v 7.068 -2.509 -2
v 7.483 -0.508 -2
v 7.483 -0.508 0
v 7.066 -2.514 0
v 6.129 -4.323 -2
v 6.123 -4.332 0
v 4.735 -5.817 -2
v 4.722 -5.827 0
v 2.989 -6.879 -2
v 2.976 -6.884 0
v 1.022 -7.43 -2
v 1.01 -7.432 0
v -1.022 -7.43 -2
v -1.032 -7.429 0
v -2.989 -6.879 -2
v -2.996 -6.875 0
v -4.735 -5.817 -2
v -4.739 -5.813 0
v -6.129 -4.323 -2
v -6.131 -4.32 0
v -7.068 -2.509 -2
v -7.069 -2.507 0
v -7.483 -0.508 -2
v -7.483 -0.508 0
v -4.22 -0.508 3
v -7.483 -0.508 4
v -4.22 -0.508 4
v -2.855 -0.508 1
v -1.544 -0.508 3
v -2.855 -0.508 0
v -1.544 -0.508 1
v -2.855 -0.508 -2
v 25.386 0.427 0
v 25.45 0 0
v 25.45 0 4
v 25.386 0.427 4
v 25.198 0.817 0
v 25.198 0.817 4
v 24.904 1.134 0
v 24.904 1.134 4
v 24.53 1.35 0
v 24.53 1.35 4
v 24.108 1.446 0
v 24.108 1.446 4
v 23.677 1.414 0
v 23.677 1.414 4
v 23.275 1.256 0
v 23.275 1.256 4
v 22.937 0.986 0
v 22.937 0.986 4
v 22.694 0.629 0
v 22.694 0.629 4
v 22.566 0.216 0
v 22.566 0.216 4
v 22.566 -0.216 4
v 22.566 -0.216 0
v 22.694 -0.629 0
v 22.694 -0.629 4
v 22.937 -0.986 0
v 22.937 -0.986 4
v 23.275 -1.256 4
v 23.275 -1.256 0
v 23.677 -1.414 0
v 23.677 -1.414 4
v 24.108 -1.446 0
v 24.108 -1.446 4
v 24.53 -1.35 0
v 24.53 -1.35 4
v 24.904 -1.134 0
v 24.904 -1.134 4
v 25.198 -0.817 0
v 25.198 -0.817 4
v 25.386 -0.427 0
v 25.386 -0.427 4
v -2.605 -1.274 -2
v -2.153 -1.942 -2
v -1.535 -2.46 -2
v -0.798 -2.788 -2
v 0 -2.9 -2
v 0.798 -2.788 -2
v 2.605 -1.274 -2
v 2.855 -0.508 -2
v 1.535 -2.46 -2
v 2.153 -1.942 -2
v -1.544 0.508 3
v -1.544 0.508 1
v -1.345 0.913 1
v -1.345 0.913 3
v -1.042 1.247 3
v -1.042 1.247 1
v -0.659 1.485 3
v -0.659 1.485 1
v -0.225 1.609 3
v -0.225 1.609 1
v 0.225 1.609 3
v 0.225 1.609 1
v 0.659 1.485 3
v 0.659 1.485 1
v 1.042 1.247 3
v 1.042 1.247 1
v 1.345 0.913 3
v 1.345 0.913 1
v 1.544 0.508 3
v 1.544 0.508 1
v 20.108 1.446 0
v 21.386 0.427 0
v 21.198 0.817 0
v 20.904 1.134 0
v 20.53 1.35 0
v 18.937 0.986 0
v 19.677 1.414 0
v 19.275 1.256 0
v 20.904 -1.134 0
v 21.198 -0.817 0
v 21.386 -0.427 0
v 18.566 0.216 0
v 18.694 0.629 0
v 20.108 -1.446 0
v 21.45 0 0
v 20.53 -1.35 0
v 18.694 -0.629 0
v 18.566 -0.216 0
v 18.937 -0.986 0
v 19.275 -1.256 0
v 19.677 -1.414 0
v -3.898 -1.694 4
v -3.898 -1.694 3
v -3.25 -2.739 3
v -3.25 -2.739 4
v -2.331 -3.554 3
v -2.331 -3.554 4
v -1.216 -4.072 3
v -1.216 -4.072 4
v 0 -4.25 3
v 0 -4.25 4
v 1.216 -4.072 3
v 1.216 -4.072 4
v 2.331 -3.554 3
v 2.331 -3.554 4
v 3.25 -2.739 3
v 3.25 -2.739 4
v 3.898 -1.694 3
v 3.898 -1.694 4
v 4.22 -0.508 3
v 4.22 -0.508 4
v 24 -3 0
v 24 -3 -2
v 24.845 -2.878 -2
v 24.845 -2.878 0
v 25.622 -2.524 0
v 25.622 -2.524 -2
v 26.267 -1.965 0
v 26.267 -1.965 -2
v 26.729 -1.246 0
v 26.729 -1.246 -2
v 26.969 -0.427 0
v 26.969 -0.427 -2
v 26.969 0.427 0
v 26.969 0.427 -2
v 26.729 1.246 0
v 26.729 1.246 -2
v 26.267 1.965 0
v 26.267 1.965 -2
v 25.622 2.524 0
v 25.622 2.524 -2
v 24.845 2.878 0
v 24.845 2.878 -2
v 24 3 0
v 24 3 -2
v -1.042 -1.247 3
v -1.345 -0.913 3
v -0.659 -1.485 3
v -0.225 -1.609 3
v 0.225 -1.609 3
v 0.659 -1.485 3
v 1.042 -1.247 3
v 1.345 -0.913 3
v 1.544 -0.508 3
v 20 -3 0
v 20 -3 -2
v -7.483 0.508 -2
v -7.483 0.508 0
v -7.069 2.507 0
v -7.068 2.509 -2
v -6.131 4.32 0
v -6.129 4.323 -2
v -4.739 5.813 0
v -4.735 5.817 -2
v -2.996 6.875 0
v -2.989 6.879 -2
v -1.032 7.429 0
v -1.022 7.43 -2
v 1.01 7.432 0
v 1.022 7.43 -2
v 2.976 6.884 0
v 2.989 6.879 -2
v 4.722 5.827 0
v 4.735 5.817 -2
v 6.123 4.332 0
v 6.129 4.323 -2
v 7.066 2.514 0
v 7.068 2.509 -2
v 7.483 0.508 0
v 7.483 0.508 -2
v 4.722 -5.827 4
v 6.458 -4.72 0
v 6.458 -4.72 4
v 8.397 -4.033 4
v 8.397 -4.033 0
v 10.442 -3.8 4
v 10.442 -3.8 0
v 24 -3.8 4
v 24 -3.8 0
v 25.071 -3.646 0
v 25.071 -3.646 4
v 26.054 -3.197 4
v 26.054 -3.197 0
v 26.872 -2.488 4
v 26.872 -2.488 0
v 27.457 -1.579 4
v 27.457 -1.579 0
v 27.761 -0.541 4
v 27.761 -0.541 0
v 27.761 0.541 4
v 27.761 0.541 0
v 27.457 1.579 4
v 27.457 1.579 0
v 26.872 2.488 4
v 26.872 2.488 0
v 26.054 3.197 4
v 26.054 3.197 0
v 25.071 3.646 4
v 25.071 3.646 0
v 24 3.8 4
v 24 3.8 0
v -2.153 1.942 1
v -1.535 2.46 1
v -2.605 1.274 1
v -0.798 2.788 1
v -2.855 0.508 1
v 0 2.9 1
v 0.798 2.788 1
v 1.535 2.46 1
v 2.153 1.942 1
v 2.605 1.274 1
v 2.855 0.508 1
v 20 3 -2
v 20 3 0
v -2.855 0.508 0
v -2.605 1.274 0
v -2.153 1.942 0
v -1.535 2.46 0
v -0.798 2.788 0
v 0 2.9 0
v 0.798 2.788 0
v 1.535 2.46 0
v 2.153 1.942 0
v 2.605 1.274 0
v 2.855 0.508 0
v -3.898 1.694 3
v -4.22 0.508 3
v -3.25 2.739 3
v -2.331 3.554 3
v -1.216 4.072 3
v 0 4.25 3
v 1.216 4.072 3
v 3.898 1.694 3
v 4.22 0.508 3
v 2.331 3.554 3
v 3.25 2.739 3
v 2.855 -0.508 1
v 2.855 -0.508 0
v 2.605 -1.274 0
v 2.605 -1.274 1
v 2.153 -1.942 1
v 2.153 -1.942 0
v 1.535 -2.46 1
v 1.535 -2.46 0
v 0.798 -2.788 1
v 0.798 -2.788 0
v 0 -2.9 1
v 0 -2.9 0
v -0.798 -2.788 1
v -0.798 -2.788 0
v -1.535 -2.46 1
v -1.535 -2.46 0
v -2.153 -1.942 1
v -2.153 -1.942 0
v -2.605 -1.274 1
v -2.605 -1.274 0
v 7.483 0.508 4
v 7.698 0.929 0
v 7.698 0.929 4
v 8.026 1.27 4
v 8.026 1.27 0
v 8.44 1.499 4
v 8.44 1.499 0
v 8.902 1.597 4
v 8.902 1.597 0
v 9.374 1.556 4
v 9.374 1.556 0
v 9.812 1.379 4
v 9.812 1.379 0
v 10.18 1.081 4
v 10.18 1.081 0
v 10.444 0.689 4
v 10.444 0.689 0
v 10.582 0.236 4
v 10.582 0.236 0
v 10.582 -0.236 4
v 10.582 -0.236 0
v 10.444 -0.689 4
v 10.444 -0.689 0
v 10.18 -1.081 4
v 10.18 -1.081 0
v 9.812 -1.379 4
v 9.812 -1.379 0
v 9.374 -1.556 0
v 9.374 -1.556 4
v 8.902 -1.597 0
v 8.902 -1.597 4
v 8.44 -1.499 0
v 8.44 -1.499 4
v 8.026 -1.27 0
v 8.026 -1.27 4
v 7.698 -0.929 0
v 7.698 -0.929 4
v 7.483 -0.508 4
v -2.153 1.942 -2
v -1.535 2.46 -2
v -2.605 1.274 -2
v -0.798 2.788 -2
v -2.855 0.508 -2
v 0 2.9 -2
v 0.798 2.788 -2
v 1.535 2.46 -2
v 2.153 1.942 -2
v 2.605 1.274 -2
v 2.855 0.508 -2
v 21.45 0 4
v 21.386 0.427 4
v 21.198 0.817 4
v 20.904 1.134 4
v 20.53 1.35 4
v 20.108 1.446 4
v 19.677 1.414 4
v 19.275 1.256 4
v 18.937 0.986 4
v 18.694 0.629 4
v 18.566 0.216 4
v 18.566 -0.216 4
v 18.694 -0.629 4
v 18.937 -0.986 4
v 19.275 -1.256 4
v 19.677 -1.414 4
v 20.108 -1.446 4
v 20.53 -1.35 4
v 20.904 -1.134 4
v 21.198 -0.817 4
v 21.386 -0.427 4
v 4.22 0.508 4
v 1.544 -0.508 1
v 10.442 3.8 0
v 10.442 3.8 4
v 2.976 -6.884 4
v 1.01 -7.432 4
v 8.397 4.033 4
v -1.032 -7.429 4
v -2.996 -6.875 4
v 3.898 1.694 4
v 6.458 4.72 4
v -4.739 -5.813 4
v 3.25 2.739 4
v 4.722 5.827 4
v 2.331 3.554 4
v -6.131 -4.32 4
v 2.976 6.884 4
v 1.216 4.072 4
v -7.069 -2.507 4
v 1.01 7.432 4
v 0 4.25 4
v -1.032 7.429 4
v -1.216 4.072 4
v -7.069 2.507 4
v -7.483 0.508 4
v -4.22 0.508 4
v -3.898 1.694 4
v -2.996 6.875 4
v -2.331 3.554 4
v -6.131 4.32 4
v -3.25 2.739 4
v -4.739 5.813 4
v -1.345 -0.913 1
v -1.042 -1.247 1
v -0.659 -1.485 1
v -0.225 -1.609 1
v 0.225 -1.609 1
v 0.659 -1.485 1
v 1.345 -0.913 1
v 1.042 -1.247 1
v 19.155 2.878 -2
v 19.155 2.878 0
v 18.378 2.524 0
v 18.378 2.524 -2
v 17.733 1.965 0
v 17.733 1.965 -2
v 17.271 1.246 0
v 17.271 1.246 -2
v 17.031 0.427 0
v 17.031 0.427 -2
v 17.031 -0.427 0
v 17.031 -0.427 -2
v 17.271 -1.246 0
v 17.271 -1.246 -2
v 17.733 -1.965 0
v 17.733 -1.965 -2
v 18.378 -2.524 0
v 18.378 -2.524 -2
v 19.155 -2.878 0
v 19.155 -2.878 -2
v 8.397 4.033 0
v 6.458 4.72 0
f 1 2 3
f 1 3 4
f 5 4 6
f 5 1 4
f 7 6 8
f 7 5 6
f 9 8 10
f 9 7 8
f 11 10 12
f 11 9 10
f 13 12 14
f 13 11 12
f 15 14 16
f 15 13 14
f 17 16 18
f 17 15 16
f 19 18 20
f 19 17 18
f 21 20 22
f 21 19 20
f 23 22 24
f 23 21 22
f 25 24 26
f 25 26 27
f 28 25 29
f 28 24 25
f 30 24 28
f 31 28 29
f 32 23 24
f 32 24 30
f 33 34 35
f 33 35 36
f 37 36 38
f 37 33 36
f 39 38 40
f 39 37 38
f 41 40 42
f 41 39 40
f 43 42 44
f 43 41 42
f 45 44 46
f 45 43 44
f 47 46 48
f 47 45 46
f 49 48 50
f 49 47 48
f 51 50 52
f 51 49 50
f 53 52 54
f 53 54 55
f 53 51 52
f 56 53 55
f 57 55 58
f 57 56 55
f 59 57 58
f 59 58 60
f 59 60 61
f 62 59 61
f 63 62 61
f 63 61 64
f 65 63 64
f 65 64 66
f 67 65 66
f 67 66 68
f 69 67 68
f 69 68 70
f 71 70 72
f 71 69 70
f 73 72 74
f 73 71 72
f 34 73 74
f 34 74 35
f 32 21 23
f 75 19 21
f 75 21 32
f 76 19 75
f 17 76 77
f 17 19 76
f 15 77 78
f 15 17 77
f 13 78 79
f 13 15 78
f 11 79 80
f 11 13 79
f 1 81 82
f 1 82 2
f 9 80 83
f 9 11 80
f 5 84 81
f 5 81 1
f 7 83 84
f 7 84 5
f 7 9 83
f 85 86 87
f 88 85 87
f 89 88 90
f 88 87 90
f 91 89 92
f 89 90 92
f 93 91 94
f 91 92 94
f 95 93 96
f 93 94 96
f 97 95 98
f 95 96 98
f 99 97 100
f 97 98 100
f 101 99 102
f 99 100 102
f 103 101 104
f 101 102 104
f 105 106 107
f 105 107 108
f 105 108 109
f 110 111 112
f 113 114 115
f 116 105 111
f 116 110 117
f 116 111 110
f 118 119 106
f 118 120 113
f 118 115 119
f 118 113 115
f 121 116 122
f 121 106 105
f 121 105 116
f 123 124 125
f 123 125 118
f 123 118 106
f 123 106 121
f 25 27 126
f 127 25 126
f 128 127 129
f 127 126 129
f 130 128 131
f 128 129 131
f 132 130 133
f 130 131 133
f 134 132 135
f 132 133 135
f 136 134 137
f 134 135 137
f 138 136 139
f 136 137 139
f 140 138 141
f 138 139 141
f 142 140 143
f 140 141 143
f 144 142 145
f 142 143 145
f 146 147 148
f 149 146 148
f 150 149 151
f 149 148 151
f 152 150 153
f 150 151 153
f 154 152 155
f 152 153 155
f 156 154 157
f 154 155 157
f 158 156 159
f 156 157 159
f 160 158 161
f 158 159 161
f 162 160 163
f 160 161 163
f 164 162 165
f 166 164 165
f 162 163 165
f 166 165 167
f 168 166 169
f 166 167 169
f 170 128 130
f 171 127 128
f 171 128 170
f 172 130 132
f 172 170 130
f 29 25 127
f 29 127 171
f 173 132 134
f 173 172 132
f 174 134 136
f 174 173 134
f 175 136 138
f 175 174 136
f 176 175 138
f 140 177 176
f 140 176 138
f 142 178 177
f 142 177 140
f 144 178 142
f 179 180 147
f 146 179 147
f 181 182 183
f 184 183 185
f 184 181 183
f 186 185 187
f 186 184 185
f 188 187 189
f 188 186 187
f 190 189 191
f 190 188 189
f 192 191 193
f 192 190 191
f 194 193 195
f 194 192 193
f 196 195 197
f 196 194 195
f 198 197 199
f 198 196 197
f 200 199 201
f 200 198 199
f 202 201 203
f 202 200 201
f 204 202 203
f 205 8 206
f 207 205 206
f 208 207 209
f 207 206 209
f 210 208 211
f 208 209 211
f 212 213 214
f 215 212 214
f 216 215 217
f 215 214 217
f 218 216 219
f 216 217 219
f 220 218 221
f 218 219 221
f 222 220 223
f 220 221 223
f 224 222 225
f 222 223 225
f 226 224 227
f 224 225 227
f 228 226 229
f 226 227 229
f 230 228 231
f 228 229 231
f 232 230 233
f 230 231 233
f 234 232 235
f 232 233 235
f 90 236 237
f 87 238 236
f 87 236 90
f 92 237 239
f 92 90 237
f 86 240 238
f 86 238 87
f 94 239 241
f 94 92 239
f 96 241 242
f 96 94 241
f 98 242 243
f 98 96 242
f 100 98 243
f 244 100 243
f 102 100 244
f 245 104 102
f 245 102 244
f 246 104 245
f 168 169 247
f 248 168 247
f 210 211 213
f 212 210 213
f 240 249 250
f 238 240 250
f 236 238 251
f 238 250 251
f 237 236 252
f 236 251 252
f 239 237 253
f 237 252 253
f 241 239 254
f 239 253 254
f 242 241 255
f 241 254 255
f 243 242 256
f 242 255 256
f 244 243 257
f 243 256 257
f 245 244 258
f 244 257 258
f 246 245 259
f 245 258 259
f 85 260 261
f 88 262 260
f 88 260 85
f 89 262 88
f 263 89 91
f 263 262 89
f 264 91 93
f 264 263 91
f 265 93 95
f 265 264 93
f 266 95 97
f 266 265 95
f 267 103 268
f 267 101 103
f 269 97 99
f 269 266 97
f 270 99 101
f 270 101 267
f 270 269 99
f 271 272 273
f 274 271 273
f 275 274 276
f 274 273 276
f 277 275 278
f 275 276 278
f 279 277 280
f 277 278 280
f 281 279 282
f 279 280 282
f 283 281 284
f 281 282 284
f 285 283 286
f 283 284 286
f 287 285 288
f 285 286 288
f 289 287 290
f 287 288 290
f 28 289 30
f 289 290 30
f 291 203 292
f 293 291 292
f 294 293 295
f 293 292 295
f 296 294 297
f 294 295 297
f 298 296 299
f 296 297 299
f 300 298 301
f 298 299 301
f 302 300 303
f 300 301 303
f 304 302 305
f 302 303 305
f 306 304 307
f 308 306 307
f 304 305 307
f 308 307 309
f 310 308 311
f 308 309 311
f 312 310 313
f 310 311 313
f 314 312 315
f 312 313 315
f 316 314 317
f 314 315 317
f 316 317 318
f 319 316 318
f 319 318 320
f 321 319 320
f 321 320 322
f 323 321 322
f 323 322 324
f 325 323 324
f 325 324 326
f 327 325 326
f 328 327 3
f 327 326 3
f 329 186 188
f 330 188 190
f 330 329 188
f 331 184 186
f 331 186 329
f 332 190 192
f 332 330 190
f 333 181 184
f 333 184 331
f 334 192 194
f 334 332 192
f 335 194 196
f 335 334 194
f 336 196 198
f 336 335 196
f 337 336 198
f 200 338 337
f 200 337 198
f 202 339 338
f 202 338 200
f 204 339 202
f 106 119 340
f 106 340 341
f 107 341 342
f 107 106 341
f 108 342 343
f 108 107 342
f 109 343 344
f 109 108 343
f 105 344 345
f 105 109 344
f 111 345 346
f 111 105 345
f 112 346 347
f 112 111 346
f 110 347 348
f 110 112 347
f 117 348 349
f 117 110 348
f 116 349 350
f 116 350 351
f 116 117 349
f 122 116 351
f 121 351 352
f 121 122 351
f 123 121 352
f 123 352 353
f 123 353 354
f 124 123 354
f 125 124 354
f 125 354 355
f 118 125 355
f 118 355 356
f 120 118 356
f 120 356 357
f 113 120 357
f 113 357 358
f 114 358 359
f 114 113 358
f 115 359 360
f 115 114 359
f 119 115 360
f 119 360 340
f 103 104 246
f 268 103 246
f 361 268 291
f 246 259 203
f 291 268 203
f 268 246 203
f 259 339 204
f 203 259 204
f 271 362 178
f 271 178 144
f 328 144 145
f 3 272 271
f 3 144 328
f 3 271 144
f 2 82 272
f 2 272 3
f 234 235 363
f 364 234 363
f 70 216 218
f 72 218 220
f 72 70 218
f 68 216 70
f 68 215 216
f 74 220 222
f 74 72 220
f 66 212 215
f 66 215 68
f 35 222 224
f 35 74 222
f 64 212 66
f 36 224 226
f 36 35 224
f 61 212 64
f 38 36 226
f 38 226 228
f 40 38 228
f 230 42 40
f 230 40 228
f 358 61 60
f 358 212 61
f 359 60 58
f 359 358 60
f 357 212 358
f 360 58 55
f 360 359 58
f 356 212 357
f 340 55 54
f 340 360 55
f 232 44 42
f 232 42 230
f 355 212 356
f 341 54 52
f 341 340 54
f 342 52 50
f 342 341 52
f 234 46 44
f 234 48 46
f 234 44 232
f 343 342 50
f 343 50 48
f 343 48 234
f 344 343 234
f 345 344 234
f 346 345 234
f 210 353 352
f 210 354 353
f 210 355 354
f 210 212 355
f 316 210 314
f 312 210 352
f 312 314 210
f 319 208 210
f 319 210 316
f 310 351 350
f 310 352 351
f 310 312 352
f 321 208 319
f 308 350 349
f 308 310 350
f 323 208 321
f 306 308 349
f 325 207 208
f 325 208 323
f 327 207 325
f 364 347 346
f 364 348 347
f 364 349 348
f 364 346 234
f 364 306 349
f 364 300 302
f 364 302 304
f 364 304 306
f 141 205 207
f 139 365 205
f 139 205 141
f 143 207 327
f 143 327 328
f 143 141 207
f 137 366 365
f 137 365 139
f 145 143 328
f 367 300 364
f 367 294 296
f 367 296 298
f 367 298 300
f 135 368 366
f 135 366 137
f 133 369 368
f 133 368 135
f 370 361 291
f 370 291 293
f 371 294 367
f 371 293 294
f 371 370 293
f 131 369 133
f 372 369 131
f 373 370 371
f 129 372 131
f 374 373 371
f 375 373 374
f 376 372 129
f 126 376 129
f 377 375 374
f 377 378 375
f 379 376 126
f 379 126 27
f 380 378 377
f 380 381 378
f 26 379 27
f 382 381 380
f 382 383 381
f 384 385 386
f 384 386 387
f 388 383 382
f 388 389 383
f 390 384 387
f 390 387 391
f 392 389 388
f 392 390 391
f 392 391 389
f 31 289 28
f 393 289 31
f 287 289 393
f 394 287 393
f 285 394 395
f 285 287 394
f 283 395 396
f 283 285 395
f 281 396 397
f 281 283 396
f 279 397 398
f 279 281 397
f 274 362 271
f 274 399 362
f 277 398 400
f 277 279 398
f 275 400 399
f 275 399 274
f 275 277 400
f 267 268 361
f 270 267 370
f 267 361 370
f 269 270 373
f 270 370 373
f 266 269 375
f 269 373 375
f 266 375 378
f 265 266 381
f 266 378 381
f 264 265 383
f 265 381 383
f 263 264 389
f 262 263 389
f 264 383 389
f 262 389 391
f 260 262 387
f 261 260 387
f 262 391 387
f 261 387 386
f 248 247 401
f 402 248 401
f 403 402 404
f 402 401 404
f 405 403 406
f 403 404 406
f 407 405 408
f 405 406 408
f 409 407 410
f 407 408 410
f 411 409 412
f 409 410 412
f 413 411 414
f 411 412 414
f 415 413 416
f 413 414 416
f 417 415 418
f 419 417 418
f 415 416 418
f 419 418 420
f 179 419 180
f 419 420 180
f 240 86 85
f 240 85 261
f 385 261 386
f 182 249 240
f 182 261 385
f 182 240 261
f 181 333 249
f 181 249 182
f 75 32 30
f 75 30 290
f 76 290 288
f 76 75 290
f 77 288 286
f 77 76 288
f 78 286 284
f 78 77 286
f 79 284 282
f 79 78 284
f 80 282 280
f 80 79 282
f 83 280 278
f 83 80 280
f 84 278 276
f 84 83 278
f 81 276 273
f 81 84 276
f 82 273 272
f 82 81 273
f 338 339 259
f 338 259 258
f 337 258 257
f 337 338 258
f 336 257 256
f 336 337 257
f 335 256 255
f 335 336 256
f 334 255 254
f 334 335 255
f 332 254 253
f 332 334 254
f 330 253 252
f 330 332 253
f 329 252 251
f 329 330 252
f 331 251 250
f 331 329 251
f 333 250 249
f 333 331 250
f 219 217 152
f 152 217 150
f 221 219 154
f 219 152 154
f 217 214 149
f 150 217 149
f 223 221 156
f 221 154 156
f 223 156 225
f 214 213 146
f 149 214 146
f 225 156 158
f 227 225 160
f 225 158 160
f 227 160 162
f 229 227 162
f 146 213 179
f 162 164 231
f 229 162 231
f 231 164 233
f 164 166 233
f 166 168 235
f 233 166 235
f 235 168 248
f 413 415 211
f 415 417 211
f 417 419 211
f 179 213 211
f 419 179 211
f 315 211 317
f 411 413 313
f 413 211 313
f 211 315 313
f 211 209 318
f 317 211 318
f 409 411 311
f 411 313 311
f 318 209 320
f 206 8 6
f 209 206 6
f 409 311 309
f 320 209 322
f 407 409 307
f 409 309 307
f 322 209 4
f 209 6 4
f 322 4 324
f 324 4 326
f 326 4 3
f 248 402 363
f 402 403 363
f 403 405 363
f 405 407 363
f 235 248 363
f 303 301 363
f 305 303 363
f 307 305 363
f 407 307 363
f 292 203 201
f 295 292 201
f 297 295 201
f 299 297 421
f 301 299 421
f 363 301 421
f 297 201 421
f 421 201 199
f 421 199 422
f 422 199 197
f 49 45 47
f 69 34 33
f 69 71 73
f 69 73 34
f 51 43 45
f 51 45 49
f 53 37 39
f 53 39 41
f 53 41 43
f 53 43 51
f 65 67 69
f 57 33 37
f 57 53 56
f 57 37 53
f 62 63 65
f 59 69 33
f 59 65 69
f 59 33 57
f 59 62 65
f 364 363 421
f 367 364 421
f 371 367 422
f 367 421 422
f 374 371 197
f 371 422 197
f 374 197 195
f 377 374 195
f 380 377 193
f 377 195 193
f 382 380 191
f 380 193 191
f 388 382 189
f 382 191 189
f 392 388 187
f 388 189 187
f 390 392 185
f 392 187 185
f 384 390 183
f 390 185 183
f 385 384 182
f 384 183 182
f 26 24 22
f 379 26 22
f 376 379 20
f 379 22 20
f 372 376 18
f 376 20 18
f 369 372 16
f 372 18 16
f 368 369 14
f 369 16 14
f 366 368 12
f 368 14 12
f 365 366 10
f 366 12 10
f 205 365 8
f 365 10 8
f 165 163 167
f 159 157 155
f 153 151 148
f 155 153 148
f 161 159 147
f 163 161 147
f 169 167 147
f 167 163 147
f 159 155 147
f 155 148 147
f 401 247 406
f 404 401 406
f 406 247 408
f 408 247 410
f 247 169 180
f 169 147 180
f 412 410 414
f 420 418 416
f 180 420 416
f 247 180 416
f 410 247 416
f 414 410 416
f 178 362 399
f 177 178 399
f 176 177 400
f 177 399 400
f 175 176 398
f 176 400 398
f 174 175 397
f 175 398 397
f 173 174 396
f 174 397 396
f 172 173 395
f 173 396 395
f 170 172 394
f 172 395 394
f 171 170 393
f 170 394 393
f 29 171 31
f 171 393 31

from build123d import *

# Parameters (mm, degrees)
SKETCH1_R           = 1.45
BOSS_EXTRUDE1_DEPTH = 4
BOSS_EXTRUDE3_START = 2
BOSS_EXTRUDE3_DEPTH = 2
SKETCH4_R           = 4.25
CUT_EXTRUDE1_DEPTH  = 1
SKETCH6_R           = 2.9
CUT_EXTRUDE2_DEPTH  = 1


with BuildPart() as part:
    # Sketch1 → Boss-Extrude1 (new body)
    with BuildSketch(Plane(origin=(0, 0, 0), x_dir=(0, 1, 0), z_dir=(0, 0, 1))):
        with BuildLine():
            ThreePointArc((-5.826821987, -4.722091224), (-4.321683338, -7.407935145), (-3.8, -10.442246667))
            Line((-3.8, -10.442246667), (-3.8, -24))
            ThreePointArc((-3.8, -24), (0, -27.8), (3.8, -24))
            Line((3.8, -24), (3.8, -10.442246667))
            ThreePointArc((3.8, -10.442246667), (4.321683338, -7.407935145), (5.826821987, -4.722091224))
            ThreePointArc((5.826821987, -4.722091224), (6.875471927, 2.99631203), (0.507973157, 7.482777778))
            Line((0.507973157, 7.482777778), (0.507973157, 1.543563498))
            ThreePointArc((0.507973157, 1.543563498), (1.625, 0), (0.507973157, -1.543563498))
            Line((0.507973157, -1.543563498), (0.507973157, -7.482777778))
            ThreePointArc((0.507973157, -7.482777778), (0, -10.6), (-0.507973157, -7.482777778))
            Line((-0.507973157, -7.482777778), (-0.507973157, -1.543563498))
            ThreePointArc((-0.507973157, -1.543563498), (-1.625, 0), (-0.507973157, 1.543563498))
            Line((-0.507973157, 1.543563498), (-0.507973157, 7.482777778))
            ThreePointArc((-0.507973157, 7.482777778), (-6.875471927, 2.99631203), (-5.826821987, -4.722091224))
        make_face()
        with Locations(Location((0, -24, 0), (0, 0, 270))):
            Circle(SKETCH1_R, mode=Mode.SUBTRACT)
        with Locations(Location((0, -20, 0), (0, 0, 270))):
            Circle(SKETCH1_R, mode=Mode.SUBTRACT)
    extrude(amount=BOSS_EXTRUDE1_DEPTH)

    # Sketch3 → Boss-Extrude3 (add)
    with BuildSketch(Plane(origin=(0, 0, 0), x_dir=(1, 0, 0), z_dir=(0, 0, -1)).offset(BOSS_EXTRUDE3_START)):
        with BuildLine():
            Line((20, 3), (24, 3))
            ThreePointArc((24, 3), (27, 0), (24, -3))
            Line((24, -3), (20, -3))
            ThreePointArc((20, -3), (17, 0), (20, 3))
        make_face()
        with BuildLine():
            Line((-7.482777778, 0.507973157), (-2.855164316, 0.507973157))
            ThreePointArc((-2.855164316, 0.507973157), (0, 2.9), (2.855164316, 0.507973157))
            Line((2.855164316, 0.507973157), (7.482777778, 0.507973157))
            ThreePointArc((7.482777778, 0.507973157), (0, 7.5), (-7.482777778, 0.507973157))
        make_face()
        with BuildLine():
            Line((-2.855164316, -0.507973157), (-7.482777778, -0.507973157))
            ThreePointArc((-7.482777778, -0.507973157), (0, -7.5), (7.482777778, -0.507973157))
            Line((7.482777778, -0.507973157), (2.855164316, -0.507973157))
            ThreePointArc((2.855164316, -0.507973157), (0, -2.9), (-2.855164316, -0.507973157))
        make_face()
    extrude(amount=-BOSS_EXTRUDE3_DEPTH)

    # Sketch4 → Cut-Extrude1 (cut)
    with BuildSketch(Plane.XY.offset(4)):
        Circle(SKETCH4_R)
    extrude(amount=-CUT_EXTRUDE1_DEPTH, mode=Mode.SUBTRACT)

    # Sketch6 → Cut-Extrude2 (cut)
    with BuildSketch(Plane(origin=(0, 0, 0), x_dir=(1, 0, 0), z_dir=(0, 0, -1))):
        Circle(SKETCH6_R)
    extrude(amount=-CUT_EXTRUDE2_DEPTH, mode=Mode.SUBTRACT)


solid = part.part
